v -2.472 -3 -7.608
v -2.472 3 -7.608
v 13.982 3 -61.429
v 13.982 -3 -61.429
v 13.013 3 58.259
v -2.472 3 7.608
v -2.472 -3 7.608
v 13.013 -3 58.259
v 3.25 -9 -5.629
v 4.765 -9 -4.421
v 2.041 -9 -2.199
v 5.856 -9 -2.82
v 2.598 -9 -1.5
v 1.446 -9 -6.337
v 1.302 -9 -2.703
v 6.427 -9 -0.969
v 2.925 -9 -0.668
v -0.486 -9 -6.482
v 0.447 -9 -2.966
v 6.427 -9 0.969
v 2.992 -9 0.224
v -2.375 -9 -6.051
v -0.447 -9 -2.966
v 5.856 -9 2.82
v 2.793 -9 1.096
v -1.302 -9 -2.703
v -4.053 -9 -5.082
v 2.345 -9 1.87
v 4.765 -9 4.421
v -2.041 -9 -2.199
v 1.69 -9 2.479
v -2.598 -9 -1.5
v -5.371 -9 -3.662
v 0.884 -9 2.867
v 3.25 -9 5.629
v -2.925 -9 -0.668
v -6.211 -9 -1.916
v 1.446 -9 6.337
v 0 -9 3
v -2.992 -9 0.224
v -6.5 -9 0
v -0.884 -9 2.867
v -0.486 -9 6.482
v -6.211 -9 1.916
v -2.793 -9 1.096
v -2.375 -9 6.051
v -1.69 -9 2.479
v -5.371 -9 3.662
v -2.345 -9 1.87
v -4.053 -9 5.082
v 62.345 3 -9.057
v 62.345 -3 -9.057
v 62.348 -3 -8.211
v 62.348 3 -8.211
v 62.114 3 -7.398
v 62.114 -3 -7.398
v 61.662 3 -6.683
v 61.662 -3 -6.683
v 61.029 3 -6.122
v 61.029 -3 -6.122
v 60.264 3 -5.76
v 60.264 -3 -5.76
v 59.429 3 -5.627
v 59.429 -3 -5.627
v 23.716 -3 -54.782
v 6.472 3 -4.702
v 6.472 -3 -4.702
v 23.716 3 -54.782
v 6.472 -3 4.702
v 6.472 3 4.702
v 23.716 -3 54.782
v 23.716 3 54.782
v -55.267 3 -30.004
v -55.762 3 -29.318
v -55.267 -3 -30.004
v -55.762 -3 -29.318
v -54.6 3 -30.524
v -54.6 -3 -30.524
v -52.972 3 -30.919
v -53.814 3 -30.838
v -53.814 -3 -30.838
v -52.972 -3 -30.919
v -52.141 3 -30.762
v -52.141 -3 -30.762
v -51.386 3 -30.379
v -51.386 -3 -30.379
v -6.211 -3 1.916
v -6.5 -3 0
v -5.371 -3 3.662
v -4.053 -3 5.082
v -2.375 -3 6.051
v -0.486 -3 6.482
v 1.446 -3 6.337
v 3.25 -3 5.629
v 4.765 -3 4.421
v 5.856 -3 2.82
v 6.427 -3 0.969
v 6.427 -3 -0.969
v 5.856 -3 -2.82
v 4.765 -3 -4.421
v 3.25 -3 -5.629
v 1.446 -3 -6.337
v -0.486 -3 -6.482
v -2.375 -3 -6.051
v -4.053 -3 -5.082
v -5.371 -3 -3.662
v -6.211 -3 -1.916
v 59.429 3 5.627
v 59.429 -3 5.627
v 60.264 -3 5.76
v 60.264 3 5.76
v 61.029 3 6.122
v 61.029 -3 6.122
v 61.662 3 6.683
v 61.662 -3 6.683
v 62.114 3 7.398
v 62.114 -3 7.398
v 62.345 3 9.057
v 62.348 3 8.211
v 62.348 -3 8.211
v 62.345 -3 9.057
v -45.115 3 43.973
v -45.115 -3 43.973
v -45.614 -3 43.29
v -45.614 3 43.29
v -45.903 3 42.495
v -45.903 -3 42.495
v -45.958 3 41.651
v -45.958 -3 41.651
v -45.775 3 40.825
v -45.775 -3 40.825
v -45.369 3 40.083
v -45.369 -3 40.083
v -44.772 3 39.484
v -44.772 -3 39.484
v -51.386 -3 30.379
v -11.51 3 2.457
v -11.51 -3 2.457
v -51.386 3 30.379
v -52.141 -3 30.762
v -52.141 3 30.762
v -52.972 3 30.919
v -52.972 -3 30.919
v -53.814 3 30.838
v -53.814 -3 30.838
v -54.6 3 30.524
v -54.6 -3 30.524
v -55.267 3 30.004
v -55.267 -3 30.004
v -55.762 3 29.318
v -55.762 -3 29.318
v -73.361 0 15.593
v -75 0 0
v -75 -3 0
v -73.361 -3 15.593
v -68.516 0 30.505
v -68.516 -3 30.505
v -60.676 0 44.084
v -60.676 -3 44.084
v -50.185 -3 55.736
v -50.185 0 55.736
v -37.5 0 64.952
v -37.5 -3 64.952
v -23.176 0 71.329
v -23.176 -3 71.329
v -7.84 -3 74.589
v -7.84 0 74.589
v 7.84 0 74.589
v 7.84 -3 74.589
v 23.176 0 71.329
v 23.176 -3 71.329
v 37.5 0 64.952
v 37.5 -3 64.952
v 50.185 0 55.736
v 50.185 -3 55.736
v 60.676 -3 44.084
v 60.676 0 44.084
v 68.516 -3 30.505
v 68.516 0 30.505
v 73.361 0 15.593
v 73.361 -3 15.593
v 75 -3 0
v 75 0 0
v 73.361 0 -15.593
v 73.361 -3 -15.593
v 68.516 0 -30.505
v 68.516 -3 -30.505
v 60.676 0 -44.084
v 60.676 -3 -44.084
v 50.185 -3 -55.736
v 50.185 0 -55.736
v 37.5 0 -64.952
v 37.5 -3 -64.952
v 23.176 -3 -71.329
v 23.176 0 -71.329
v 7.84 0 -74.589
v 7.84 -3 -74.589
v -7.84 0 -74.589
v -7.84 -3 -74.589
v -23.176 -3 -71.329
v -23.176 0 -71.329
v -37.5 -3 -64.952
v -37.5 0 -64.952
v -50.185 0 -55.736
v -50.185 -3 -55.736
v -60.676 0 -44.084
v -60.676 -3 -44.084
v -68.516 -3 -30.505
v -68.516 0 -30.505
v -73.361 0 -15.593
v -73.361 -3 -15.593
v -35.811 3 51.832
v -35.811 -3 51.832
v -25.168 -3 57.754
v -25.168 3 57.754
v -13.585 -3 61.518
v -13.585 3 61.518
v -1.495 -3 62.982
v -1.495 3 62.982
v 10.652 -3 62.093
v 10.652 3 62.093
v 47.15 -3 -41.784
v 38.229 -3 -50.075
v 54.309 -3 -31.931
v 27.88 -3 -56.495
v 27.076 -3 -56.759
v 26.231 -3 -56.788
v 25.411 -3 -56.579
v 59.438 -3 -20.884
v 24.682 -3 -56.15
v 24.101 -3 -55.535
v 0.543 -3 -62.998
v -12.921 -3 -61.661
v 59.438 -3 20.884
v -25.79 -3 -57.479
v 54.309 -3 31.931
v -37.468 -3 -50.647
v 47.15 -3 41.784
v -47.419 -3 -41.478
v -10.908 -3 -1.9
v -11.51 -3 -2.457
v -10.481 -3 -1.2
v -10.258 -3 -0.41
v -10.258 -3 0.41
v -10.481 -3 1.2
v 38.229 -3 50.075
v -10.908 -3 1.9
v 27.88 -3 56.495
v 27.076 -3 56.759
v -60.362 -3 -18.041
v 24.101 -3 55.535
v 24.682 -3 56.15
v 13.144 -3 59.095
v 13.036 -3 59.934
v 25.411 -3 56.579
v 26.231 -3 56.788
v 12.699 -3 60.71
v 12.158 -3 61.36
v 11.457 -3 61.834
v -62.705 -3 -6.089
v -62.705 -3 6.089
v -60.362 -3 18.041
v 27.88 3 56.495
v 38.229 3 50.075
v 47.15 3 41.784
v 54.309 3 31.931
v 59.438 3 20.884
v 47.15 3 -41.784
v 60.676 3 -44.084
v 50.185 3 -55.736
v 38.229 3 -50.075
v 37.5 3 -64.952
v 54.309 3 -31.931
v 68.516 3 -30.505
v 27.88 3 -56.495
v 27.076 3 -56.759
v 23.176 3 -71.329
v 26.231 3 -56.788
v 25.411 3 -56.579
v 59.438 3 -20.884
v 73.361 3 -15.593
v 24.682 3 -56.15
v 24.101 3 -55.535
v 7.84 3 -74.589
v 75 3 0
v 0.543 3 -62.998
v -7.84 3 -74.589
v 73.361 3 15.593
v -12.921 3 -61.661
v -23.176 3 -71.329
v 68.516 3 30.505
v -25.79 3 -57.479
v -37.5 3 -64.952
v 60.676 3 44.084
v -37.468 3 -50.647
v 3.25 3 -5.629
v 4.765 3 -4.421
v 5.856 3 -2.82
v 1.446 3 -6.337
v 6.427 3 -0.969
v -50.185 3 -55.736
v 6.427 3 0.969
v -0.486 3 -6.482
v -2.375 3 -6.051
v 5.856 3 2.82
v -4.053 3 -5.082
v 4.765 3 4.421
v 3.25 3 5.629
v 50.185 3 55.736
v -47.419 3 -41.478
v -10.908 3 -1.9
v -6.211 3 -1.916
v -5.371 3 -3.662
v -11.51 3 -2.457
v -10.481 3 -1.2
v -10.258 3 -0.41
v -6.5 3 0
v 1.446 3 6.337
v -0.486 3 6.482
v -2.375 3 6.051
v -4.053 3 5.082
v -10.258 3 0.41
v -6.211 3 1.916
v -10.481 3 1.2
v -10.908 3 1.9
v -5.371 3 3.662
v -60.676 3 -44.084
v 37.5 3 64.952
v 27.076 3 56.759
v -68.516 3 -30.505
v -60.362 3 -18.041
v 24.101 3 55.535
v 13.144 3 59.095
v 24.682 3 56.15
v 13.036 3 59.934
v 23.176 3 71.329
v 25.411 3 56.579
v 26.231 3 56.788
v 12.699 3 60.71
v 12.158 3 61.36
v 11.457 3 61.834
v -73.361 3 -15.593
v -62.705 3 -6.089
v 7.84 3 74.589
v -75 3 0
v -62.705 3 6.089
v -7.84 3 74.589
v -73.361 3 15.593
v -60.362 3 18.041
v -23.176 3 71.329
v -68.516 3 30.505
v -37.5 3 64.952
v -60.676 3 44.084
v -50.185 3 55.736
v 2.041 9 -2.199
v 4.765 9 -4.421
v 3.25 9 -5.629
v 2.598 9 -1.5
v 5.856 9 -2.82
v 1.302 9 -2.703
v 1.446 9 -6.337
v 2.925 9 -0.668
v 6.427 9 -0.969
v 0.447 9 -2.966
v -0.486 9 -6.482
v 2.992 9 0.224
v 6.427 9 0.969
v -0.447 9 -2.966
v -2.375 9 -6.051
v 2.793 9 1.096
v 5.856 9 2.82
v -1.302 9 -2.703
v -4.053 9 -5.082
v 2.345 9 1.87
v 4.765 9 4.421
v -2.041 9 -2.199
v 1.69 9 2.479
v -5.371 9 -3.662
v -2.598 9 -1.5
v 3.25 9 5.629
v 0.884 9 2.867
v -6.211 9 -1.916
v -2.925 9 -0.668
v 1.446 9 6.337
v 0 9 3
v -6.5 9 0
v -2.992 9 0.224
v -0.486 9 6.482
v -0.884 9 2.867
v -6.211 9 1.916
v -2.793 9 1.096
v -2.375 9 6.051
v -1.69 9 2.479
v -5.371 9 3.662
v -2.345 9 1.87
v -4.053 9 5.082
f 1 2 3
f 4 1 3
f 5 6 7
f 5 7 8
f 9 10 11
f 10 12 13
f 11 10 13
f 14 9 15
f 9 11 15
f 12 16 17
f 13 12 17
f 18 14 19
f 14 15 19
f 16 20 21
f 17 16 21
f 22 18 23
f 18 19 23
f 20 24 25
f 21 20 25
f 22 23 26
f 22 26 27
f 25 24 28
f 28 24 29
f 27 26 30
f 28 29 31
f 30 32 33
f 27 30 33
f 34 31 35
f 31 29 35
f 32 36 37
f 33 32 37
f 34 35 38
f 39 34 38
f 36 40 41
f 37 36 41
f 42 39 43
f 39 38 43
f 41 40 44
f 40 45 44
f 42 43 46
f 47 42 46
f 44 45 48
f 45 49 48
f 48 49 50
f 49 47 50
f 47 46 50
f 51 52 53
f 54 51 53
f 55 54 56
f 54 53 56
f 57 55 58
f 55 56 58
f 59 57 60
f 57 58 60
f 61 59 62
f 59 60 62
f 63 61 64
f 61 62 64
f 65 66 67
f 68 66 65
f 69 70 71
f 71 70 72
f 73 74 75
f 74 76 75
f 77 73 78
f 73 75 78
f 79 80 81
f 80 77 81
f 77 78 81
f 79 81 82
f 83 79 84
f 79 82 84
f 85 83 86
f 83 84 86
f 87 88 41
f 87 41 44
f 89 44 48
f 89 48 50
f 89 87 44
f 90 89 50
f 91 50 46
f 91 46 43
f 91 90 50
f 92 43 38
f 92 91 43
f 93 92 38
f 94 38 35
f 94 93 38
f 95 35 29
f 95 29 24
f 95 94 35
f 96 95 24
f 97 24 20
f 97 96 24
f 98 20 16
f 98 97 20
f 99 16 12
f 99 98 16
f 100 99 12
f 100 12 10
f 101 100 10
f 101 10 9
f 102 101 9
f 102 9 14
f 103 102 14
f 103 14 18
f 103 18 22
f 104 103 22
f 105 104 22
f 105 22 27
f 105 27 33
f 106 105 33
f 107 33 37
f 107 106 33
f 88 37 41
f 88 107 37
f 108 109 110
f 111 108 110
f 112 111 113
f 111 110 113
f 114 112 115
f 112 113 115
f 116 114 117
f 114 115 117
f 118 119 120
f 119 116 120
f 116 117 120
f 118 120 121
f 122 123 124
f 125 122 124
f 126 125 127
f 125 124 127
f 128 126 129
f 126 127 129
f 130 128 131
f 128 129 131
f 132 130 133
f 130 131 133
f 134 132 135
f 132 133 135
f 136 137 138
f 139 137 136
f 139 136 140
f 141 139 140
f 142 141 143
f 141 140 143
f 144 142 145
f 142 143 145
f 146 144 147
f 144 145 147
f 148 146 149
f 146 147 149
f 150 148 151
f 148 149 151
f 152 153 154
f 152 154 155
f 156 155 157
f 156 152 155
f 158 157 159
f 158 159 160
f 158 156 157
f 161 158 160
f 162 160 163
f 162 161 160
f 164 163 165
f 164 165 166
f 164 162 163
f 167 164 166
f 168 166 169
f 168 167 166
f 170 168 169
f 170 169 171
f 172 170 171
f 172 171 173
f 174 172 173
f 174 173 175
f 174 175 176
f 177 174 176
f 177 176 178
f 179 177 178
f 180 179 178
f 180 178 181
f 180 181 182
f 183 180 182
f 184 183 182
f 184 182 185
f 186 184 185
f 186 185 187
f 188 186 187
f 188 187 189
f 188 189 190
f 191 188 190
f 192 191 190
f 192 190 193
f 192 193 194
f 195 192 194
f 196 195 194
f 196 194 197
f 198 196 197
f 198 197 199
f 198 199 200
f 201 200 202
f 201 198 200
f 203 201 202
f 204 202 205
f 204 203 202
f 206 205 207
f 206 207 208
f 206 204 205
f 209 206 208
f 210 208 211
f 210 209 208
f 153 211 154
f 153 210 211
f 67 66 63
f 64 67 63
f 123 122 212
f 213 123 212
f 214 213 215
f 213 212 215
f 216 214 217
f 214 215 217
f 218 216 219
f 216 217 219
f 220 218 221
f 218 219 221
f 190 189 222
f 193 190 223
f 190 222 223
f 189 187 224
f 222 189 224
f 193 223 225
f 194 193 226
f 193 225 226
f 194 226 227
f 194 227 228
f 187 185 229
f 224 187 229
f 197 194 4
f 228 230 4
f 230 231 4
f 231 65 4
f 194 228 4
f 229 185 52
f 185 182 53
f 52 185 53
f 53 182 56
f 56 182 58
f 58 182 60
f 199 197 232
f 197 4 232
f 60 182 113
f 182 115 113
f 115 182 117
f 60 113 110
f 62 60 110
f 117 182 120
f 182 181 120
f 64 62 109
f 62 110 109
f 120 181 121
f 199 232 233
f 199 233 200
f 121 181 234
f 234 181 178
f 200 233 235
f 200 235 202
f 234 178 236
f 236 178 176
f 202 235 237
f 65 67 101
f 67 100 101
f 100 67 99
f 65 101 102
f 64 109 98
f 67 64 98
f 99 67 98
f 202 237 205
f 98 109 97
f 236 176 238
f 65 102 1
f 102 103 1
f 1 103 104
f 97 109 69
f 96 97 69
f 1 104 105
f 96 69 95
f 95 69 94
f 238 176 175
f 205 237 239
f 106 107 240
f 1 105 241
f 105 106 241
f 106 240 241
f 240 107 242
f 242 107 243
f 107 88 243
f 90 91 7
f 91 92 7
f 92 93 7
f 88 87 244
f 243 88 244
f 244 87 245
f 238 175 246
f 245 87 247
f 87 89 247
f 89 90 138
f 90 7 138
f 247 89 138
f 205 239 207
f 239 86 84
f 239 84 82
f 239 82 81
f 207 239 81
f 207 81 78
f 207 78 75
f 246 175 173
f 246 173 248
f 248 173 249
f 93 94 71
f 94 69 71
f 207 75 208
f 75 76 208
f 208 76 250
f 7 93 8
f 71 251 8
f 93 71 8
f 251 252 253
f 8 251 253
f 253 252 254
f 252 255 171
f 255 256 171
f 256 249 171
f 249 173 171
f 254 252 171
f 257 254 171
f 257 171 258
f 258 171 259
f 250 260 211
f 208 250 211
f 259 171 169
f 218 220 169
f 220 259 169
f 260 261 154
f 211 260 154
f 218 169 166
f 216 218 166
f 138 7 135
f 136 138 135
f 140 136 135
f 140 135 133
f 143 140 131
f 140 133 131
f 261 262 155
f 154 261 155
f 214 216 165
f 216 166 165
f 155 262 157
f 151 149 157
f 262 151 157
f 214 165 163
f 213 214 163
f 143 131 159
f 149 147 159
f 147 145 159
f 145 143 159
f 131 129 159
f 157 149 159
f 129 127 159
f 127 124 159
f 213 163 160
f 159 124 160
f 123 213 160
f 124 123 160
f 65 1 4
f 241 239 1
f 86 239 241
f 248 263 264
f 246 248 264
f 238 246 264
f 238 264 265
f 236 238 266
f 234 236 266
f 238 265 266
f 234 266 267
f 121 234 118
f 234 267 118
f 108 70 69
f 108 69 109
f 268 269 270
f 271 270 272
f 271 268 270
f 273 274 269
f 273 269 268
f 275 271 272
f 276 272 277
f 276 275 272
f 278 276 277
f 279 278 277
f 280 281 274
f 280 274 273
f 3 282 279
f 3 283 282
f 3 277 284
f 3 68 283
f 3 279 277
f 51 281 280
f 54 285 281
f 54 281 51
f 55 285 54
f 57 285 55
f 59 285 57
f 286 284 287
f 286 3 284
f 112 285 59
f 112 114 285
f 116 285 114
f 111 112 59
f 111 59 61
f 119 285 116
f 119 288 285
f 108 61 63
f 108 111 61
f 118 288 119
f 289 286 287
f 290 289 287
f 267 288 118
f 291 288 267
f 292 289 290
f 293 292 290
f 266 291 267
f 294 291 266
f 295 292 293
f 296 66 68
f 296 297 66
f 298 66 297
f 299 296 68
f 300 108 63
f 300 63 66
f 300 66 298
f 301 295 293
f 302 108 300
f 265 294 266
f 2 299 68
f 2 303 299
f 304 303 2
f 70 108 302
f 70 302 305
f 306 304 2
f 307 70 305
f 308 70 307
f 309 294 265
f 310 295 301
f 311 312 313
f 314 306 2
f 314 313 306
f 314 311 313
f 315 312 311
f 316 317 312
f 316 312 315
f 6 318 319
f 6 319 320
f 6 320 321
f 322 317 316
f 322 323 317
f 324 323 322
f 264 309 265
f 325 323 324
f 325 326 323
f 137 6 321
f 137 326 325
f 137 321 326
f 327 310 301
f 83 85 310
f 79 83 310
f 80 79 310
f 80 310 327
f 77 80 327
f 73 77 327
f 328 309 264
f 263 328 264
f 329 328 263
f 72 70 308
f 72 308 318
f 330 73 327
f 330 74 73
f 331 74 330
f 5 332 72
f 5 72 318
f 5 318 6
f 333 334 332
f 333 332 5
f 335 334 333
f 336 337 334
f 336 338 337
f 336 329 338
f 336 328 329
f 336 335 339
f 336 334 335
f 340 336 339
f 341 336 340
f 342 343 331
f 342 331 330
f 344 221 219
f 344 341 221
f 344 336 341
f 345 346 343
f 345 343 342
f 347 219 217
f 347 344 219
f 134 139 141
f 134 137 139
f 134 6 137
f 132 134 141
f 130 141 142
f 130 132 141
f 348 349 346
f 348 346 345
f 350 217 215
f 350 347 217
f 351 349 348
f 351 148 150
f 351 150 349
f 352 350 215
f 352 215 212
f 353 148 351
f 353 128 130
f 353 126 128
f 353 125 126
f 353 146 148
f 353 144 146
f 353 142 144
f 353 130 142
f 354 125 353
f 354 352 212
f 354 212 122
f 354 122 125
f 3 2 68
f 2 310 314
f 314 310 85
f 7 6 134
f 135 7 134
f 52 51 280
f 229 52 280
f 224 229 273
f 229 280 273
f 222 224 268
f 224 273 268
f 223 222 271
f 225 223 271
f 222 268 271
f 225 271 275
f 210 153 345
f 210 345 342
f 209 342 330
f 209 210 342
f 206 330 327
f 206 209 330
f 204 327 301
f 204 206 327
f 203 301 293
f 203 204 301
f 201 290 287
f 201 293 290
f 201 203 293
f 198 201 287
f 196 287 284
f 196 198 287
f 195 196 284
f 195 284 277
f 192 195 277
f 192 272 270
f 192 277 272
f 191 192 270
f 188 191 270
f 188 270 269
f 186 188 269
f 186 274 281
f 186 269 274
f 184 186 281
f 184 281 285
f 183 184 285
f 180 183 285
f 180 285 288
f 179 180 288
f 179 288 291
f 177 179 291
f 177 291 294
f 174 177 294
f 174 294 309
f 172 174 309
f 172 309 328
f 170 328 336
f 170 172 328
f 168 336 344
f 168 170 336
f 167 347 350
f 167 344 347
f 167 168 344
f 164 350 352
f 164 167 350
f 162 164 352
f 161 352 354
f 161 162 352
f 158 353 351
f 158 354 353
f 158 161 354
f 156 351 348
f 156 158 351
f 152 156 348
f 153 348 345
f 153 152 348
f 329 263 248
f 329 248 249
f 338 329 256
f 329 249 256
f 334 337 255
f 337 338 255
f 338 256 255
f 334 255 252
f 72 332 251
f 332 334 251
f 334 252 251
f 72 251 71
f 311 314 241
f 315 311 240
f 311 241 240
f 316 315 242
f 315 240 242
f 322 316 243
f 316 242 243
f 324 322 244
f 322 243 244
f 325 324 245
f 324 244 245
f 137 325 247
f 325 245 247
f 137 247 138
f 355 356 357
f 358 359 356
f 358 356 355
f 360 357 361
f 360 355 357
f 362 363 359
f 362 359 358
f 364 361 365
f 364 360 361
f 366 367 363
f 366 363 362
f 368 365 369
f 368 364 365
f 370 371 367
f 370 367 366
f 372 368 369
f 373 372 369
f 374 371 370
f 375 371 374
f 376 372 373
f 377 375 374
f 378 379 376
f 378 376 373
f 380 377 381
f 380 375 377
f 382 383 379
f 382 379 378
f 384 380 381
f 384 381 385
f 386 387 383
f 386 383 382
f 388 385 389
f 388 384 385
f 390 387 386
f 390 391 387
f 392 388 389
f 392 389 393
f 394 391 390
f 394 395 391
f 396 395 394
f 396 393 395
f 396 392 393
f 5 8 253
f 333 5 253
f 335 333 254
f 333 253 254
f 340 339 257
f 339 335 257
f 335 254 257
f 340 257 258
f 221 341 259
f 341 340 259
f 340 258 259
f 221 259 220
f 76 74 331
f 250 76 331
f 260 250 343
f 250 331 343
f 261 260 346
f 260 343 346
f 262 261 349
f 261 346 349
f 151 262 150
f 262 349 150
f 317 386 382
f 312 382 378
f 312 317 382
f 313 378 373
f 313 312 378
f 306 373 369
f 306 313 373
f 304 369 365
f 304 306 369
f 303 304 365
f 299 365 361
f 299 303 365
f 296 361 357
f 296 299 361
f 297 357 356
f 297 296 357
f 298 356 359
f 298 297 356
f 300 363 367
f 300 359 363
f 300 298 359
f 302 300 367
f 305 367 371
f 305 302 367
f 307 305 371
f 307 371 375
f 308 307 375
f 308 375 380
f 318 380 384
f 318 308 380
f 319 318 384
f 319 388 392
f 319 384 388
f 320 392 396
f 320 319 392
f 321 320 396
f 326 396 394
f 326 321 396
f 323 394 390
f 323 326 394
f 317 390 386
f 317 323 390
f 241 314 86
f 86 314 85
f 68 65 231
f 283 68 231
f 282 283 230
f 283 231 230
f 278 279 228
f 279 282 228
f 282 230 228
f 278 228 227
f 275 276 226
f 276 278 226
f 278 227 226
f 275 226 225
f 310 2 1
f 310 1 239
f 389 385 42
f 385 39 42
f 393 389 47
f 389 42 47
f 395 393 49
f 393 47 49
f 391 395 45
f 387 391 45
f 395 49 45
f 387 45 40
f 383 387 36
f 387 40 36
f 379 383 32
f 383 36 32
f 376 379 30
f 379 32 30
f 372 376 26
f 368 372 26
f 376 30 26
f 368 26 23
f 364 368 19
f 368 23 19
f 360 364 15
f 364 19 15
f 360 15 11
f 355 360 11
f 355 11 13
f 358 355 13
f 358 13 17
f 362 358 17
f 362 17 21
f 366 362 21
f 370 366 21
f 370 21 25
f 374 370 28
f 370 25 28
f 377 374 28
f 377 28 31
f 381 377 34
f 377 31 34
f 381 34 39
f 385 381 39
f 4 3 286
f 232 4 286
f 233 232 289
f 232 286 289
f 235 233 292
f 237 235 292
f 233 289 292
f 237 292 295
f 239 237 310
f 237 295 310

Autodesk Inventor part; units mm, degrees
ref_plane "YZ Plane" through (0, 0, 0) normal (1, 0, 0) x (0, 1, 0)
ref_plane "XY Plane" through (0, 0, 0) normal (0, 0, 1) x (1, 0, 0)
sketch "Skizze1" plane through (0, 0, 0) normal (0, 1, 0) x (-1, 0, 0)
  circle A0 centre (0, 0) radius 75
  dimension "d0" = 150
extrude "Extrusion1" add sketch "Skizze1" along normal mid plane 6
ref_plane "Arbeitsebene1" through (0, 0, 0) normal (0, 1, 0) x (-1, 0, 0)
sketch "Skizze4" plane through (0, 0, 0) normal (0, 1, 0) x (-1, 0, 0)
  circle A0 centre (0, 0) radius 6.5
  dimension "d17" = 13
extrude "Extrusion3" add sketch "Skizze4" along normal mid plane 18
sketch "Skizze5" plane through (0, 9, 0) normal (0, 1, 0) x (1, 0, 0)
  circle A0 centre (0, 0) radius 6.5 projected
hole "Bohrung1" at (0, 9, 0) direction (0, -1, 0) diameter 6 end up to surface
sketch "Skizze2" plane through (0, 3, 0) normal (0, 1, 0) x (1, 0, 0)
  circle A0 centre (0, 0) radius 63 construction
  circle A1 centre (0, 0) radius 75 projected
  line L0 (0, 0) -> (0, -75) construction
  line L1 (0, 0) -> (-75, 0) construction
  circle A2 centre (0, 0) radius 6.5 projected
  line L2 (-8, 0) -> (-54.1014, -32.2806)
  line L3 (-8, 0) -> (-54.1014, 32.2806)
  arc A3 (-54.1014, 32.2806) -> (-54.1014, -32.2806) centre (0, 0) ccw
  dimension "d3" = 126
  dimension "d40" = 8
  dimension "d41" = 35
extrude "Extrusion2" cut sketch "Skizze2" against normal up to surface (6 mm away) contours L2 A3 L3
fillet "Rundung1" radius 3 3 edges at (-8, 0, 0) (-54.1014, 0, 32.2806) (-54.1014, 0, -32.2806)
pattern_circular "Runde Anordnung3" count 5 over 360 about axis through (0, 0, 0) along (0, 1, 0) of "Extrusion2"
fillet "Rundung3" radius 3 6 edges at (24.7949, 0, -57.9156) (62.743, 0, -5.6845) (62.743, 0, 5.6845) (24.7949, 0, 57.9156) (13.9824, 0, 61.4288) (-47.4189, 0, 41.4783)
properties part number "wheel" material "Aluminium 6061"
